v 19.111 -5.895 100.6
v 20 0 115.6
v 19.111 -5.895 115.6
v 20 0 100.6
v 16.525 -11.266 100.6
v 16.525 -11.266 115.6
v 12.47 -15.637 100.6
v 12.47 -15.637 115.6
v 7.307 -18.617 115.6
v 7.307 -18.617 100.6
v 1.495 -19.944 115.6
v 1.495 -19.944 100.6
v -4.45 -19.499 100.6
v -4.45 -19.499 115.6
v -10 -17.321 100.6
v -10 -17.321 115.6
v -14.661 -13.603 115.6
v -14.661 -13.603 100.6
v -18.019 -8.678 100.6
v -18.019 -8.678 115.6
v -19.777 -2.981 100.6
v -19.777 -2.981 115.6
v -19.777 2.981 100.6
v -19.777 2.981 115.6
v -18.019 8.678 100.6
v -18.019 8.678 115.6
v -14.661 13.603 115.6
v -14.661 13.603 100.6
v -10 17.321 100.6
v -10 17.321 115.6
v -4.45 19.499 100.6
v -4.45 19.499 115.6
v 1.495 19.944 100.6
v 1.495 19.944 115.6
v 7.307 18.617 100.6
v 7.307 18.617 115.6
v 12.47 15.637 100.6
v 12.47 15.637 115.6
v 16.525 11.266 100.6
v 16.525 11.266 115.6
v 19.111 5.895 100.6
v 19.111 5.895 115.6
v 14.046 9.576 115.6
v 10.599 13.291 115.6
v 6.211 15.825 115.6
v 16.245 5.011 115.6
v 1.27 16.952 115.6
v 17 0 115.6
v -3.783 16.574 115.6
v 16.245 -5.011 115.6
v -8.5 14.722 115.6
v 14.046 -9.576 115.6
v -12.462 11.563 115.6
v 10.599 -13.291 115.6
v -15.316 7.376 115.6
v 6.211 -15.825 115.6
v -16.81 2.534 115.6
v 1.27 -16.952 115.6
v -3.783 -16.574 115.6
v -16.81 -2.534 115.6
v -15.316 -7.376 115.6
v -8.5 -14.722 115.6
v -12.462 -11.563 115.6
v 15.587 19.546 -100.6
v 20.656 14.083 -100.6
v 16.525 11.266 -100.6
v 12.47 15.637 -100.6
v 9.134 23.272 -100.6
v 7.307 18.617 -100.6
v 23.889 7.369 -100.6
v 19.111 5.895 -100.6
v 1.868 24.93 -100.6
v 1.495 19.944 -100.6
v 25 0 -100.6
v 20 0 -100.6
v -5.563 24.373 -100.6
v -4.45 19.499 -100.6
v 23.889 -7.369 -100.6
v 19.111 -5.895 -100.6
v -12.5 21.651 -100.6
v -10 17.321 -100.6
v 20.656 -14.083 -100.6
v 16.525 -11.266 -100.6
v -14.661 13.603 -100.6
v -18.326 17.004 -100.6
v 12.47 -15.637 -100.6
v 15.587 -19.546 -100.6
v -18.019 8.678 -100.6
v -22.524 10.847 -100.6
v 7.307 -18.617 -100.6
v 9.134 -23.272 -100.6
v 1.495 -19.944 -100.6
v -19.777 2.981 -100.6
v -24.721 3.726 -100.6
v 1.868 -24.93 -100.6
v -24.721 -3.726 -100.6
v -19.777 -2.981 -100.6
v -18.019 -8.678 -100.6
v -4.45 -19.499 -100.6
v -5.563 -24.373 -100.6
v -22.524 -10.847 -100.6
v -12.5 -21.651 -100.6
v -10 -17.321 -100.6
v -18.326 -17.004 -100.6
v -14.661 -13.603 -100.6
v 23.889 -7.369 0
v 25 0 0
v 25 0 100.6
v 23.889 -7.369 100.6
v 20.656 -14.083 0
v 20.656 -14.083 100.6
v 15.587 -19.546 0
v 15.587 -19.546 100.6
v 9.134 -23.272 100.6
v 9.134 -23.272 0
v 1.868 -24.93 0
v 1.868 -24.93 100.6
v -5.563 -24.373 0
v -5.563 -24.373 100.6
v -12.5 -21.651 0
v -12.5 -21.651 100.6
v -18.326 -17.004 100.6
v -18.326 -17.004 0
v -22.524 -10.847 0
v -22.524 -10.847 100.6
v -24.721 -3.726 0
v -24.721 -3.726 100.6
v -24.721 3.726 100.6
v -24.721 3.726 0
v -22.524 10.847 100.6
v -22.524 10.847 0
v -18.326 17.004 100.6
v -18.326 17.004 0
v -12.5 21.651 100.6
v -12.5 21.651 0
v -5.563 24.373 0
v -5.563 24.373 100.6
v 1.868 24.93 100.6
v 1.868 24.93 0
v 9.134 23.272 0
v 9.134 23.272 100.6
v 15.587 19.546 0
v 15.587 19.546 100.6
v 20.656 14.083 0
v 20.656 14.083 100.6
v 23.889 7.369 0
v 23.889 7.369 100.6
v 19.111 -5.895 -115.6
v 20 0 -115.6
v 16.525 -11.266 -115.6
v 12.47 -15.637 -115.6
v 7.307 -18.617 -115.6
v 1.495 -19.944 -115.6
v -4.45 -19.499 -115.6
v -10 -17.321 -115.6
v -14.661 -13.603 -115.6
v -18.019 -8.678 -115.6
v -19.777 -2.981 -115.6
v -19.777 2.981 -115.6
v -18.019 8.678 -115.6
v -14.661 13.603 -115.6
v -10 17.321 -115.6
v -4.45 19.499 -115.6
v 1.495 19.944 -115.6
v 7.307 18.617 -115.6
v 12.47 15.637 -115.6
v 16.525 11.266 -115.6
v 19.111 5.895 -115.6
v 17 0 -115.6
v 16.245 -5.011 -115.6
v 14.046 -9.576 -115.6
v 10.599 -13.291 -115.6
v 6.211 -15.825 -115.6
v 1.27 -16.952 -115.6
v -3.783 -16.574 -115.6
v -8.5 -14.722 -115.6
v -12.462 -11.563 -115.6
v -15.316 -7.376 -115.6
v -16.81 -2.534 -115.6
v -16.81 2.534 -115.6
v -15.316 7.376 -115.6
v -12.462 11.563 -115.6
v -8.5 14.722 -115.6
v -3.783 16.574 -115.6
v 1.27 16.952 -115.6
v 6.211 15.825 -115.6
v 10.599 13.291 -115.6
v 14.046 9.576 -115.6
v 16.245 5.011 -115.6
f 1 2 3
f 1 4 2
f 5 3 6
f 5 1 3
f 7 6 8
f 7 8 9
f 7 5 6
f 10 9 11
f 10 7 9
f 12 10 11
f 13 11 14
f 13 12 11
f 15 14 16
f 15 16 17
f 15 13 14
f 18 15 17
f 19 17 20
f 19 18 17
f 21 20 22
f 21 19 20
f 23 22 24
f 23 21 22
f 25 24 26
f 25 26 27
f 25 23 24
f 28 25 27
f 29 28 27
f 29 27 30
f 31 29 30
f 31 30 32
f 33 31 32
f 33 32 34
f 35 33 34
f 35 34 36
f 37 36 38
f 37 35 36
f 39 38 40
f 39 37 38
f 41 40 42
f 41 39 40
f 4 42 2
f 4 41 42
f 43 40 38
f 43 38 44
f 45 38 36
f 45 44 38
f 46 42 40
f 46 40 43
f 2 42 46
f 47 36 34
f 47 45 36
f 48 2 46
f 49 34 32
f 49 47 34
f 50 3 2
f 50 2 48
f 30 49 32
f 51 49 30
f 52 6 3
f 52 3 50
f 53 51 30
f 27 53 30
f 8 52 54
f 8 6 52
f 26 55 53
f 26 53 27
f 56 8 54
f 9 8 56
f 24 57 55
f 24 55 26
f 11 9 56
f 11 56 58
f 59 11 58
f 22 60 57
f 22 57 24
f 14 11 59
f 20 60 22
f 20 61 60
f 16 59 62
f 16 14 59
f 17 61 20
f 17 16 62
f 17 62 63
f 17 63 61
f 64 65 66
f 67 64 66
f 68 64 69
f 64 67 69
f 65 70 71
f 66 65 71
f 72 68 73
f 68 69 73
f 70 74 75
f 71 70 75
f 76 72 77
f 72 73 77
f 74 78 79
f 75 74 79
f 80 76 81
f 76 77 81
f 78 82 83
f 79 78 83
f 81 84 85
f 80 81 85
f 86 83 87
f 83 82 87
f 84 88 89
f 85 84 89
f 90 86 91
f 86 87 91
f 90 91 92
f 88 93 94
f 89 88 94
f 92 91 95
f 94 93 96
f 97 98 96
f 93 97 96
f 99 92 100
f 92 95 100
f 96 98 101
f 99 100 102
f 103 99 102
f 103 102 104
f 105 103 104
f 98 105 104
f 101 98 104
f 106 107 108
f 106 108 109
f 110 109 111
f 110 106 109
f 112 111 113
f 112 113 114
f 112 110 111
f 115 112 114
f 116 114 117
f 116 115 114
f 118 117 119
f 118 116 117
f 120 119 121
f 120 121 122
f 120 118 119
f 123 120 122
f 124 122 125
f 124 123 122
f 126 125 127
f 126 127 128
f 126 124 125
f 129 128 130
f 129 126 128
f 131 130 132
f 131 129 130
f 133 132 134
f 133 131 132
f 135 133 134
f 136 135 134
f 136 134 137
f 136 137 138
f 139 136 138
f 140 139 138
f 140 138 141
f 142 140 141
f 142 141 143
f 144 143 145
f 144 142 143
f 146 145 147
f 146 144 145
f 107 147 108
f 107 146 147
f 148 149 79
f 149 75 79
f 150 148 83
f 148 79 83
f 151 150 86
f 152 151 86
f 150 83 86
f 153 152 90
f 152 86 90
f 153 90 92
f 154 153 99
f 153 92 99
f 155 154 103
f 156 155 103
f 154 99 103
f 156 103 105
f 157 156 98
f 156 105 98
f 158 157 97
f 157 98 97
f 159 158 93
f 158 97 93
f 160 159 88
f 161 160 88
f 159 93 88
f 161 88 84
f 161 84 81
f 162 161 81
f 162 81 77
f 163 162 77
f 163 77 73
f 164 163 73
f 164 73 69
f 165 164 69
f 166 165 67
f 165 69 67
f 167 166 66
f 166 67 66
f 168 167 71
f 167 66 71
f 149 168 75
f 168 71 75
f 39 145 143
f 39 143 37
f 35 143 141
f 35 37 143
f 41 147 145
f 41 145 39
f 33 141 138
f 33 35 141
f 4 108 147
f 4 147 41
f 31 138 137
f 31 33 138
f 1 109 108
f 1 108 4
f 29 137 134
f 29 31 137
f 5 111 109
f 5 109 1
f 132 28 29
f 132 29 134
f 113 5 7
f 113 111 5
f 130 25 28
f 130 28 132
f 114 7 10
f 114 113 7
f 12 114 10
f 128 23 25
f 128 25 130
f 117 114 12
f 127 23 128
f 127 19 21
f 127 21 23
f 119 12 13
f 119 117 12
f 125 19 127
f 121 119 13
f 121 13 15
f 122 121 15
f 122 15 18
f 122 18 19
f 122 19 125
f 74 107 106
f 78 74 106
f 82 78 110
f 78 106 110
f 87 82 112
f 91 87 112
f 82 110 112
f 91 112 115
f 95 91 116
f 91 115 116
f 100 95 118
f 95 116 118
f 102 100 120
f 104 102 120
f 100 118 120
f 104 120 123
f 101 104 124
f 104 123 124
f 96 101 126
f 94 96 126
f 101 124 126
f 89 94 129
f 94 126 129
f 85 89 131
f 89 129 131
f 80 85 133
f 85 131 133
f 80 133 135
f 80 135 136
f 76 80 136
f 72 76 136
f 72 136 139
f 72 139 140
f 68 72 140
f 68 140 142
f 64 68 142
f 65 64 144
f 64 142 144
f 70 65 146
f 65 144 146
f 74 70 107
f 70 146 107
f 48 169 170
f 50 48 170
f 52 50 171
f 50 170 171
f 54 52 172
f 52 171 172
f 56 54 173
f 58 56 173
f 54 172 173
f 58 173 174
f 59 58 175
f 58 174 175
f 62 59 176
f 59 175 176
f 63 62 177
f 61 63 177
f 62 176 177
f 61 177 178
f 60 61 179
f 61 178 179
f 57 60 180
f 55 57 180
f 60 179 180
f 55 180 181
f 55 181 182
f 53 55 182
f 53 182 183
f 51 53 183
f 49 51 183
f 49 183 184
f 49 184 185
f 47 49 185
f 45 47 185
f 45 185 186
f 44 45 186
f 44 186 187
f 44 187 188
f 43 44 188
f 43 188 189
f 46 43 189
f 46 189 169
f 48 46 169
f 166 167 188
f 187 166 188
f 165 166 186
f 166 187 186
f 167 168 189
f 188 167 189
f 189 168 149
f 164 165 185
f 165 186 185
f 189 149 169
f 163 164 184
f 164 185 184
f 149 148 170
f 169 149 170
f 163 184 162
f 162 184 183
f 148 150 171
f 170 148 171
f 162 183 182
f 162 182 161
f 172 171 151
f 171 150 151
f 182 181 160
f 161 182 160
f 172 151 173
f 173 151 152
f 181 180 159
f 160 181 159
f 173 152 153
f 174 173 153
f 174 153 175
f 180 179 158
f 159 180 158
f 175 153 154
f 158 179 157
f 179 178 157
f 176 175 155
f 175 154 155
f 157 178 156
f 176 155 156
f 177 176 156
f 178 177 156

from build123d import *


with BuildPart() as part:
    # Эскиз1 → Повернуть1 (revolve)
    with BuildSketch(Plane(origin=(0, 0, 0), x_dir=(1, 0, 0), z_dir=(0, 1, 0)), mode=Mode.PRIVATE) as revolve_1_sk:
        Polygon((-25, 0), (-17, 0), (-17, -115.6), (-20, -115.6), (-20, -100.6), (-25, -100.6), align=None)
    revolve_1 = revolve(revolve_1_sk.sketch.rotate(Axis((0, 0, 1000), (0, 0, -1)), 180), axis=Axis((0, 0, 1000), (0, 0, -1)))

    # Зеркальное отражение1: Повернуть1 across plane
    add(revolve_1.mirror(Plane(origin=(-25, 0, 0), x_dir=(1, 0, 0), z_dir=(0, 0, 1))))


solid = part.part
